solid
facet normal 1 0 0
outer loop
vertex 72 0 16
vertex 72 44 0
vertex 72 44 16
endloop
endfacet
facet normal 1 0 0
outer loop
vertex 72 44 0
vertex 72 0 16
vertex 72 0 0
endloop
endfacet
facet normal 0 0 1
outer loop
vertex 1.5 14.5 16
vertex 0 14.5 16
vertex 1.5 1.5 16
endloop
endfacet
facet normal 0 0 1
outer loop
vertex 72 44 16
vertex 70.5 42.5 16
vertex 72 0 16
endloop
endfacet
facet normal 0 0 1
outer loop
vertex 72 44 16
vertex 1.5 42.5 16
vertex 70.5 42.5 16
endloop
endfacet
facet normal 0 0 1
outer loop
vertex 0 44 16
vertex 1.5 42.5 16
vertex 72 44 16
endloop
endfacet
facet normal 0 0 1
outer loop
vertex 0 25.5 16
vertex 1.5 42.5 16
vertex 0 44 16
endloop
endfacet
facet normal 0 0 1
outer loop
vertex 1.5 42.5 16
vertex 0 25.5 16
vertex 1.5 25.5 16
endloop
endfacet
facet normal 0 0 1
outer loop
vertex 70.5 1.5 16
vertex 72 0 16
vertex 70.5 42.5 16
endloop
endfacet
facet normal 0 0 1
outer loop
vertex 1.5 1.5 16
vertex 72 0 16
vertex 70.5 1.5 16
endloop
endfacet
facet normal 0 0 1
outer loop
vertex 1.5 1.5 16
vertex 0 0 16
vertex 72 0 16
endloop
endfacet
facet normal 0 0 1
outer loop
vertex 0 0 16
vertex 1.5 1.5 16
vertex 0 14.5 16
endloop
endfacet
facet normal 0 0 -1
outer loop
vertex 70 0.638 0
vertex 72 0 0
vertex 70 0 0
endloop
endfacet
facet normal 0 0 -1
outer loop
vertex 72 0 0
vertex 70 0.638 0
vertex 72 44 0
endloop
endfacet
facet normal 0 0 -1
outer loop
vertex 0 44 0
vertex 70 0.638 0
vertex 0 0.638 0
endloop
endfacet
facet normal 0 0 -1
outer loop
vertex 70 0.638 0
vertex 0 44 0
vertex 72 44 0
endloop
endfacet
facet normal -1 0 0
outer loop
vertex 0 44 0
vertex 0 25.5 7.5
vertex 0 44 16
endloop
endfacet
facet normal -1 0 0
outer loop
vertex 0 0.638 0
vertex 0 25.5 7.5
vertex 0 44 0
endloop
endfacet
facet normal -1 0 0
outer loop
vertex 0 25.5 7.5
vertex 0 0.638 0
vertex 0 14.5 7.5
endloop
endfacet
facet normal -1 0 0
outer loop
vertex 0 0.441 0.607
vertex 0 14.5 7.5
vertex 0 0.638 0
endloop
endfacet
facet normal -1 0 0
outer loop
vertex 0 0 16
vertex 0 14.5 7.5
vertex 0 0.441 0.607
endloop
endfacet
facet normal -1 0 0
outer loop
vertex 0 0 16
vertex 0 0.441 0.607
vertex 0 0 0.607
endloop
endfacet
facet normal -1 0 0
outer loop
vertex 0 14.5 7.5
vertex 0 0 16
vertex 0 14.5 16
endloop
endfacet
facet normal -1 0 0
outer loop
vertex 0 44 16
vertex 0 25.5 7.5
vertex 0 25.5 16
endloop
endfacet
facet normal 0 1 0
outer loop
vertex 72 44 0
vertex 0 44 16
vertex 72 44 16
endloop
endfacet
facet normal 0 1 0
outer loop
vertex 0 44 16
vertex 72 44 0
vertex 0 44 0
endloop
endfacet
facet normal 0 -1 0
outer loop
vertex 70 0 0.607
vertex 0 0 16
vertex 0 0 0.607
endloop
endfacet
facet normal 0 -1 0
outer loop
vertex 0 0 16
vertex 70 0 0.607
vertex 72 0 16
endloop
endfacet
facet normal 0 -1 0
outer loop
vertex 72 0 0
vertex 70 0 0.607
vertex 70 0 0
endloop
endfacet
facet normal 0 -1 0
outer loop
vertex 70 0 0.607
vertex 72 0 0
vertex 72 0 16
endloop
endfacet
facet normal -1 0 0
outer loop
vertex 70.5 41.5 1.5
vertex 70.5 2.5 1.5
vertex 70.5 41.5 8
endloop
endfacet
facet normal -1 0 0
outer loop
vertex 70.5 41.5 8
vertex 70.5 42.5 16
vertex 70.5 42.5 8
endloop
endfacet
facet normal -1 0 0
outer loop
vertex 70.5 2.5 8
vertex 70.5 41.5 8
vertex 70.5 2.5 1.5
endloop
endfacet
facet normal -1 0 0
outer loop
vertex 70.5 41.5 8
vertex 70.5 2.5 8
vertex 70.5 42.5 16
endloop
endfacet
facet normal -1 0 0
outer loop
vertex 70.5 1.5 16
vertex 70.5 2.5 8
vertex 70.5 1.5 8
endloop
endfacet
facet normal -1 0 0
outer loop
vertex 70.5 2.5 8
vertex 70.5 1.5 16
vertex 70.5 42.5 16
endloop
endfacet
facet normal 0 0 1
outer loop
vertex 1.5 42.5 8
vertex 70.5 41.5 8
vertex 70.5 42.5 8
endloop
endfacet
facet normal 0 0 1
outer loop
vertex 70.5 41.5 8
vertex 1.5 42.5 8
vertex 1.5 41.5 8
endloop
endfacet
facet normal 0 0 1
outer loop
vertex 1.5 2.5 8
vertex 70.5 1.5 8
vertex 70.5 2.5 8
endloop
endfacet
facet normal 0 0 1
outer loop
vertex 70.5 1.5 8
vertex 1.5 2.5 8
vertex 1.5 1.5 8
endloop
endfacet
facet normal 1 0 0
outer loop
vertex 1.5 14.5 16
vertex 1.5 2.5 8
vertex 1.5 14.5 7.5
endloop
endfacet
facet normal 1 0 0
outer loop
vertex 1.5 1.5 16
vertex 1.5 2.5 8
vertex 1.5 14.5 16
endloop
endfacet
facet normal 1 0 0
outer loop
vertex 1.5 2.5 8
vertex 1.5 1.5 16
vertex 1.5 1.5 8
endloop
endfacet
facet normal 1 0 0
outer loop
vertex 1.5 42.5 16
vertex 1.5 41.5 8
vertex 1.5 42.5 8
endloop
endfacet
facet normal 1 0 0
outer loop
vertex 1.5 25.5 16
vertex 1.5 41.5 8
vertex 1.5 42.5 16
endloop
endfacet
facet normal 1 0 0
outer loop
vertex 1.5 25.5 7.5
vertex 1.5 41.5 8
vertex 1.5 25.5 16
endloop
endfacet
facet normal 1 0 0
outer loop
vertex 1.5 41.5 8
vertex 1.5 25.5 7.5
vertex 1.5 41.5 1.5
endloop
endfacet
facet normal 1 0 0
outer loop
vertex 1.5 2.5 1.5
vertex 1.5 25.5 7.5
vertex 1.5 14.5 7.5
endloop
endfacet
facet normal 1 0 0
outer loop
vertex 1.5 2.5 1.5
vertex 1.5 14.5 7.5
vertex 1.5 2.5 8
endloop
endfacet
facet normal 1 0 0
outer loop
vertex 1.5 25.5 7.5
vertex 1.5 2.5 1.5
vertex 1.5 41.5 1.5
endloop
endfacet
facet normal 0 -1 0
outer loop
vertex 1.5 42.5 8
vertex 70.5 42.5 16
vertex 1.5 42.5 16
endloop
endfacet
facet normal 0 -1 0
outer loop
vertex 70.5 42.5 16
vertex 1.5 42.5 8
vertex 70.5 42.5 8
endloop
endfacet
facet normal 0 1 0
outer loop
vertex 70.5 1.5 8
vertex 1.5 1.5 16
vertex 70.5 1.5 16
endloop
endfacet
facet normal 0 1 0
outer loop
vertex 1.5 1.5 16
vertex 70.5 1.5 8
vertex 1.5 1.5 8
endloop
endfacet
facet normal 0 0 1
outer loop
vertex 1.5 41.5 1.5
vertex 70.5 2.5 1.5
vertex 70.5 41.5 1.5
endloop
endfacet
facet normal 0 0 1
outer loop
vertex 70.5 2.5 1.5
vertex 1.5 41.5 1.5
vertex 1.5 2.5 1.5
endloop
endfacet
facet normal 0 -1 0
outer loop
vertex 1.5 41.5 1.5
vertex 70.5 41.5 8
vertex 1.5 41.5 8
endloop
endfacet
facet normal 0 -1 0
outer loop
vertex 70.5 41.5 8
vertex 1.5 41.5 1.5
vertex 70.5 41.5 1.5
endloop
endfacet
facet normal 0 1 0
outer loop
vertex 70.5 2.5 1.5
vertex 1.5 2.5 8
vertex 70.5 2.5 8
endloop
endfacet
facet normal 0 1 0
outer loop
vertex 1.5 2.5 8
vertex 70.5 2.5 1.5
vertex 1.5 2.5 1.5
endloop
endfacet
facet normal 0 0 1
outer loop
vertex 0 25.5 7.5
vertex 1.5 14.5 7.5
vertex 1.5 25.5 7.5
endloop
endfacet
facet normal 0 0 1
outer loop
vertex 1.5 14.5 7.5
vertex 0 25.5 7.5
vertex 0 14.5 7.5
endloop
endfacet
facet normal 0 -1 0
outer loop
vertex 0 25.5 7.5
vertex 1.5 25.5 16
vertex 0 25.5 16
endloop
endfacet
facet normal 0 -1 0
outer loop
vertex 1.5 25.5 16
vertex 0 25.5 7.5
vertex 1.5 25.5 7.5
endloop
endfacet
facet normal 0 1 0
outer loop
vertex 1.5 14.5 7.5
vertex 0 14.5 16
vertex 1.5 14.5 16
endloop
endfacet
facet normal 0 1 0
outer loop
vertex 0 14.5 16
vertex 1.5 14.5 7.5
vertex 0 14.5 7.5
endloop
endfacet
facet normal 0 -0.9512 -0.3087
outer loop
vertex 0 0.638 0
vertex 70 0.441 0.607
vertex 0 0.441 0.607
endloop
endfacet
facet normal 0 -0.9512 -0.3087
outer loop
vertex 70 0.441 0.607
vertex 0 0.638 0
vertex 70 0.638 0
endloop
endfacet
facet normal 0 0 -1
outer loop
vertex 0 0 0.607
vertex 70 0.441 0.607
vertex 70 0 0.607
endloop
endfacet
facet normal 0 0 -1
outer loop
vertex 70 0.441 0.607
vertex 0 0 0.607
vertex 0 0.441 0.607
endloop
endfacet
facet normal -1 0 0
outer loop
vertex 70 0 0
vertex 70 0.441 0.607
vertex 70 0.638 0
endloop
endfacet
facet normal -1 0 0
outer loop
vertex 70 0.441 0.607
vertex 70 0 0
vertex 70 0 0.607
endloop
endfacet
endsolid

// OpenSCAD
module open_therm() {
  difference() {
    cube([39,29,12]);  
    translate([2,2,2]) cube([35,25,10]);   
  } 
  translate([4,4,0]) cylinder(d=5,h=4);
  translate([4,4,0]) cylinder(d=2,h=6);
  
  translate([35,25,0]) cylinder(d=5,h=4);
  translate([35,25,0]) cylinder(d=2,h=6);
}

module hall_pcb() {
  difference() {  
    cube([50,20,20]);
    translate([6.5,2.5,3.5]) cube([30,15,2]);  //pcb ausschnitt
    translate([7.5,3.5,1.5]) cube([28,13,2]); //pb lötseite  
    translate([1.2,1.2,5.5]) cube([47.6,17.6,20]);
  }
}

module hall_top() {
  cube([50,20,1.2]); 
  translate([1.5,1.5,1.2]) cube([47.5,17.5,1.2]);  
}

//noppen,platehöhe
module case_bottom(breit,tief,hoch) {
  difference() {  
    cube([breit*8,tief*8,hoch*3.2]); 
    translate([1.2,1.2,1.2]) cube([breit*8-2.4,tief*8-2.4,hoch*3.2]);  
  }
  translate([0,0,hoch*3.2-6.4]) wand_noppe();  
  translate([breit*8-16,tief*8,hoch*3.2-6.4]) rotate([0,0,270]) wand_noppe(); 
}

module wand_noppe() {
  hull () { 
    difference() {  
    cube([8,16,6.4]);
    translate([1.2,0,0]) cube([8,16,5.2]);    
  }
  }
  $fn=20;
  translate([4,4,6.4]) cylinder(d=3.2,h=1.8);
  translate([4,12,6.4]) cylinder(d=3.2,h=1.8);
}

module case_top(breit,tief,hoch) {
    difference() {  
    cube([breit*8,tief*8,hoch*3.2]); 
    translate([1.2,1.2,0]) cube([breit*8-2.4,tief*8-2.4,hoch*3.2-1.2]);  
  }
}

module hall_sensor() {
    difference() {
      union() {
        translate([0,6,0]) cylinder(d=12,h=18.5);
        // pcb raum
        translate([0,-8,0]) cube([36,20,18.5]); 
        translate([0,12,0]) cube([2,10,18]);  
      }
      //nute
      translate([0,8,1.5]) cube([32,1.6,1.5]);
      
      //innen 
      translate([1.5,-6.5,3]) cube([33,17,16]);
      translate([0,6,1.5]) cylinder(d=9,h=18);
      //stecker
      translate([34,2.5,4]) cube([2,3,15]);
    }
  translate([0,-60,0]) 
    difference() {
    union() {
      cylinder(d=12,h=1.5);
      translate([0,-6,0]) cube([40,20,1.5]);
      translate([0,0,1.5]) cylinder(d=9,h=1.5);  
      translate([1.5,-4.5,1.5]) cube([37,17,1.5]);
      translate([37,0,0]) cube([1.5,10,10]);
    }
    translate([0,-2.5,1.5]) cube([32,2,2]);
    }
}

module open_therm_botton() {
  difference () {
    cube([40,30,14]);
    translate([1.5,1.5,1.5]) cube([37,27,12.5]);  
    translate([0,15,5]) rotate([0,90,0]) cylinder($fn=16,h=2,r=2.5);  
      
  }
  translate([4.5,5,0]) union() {
      cylinder($fn=16,h=4,r=1.5);
      cylinder($fn=16,h=2.5,r=2.5);
  }
  translate([34.5,23,0]) union() {
      cylinder($fn=16,h=4,r=1.5);
      cylinder($fn=16,h=2.5,r=2.5);
  }
}

module mhi_ctrl_botton() {
  difference() {
    box_botton(69,41,8);  
  
  //  cube([69,44,15]); 
  //  translate([1.5,1.5,10]) cube([66,41,15]); 
  //  translate([1.5,2.5,1.5]) cube([65,39,10]); 
    //ausschnitt
    translate([0,14.5,7.5]) cube([7,11,10]); 
    //phase  
    rotate([0,90,0]) cylinder(r=0.75,h=70); 
      
  } 
}

module mhi_ctrl_top() {
  difference() {  
    box_top(64,41,20);
    translate([0,20,-3]) cube([4,12,5]);//bme
    translate([1.2,27,-3]) cube([2,14,16]);//c
    translate([64,12,-3]) cube([5,15,6]);//kabel
  }
  //cover bme280
  translate ([-15,15,-5]) difference() {
    cube([15,20,27]); 
    translate([1.5,1.5,0]) cube([13.5,17.5,25]); 
    for (zl = [4:4:16]) {  
    for (lo = [4:4:16]) { 
      translate([0,lo,zl]) rotate([0,90,0]) cylinder(h=10,r=1.5,$fn=8); 
        
    } 
    }
    //nase
    translate([15,20,0]) rotate([90,0,0]) cylinder(h=20,r=5); 
  }
  
}

module box_botton(pcbx,pcby,pcbh) {
  difference() {
    cube([pcbx+3,pcby+3,pcbh+8]);
    translate([1.5,1.5,pcbh]) cube([pcbx,pcby,10]); 
    translate([1.5,2.5,1.5]) cube([pcbx,pcby-2,pcbh]);  
  }  
}

module box_top(pcbx,pcby,pcbh) {
  // wand 1.2 + 0.25 platz 0.75 rand
  difference() {
    union() {
      cube([pcbx+4.4,pcby+4.4,pcbh+2]); 
      translate([1.45,1.45,pcbh]) cube([pcbx+0.5,pcby+0.5,5]);  
    }
    translate([2.45,2.45,1.5]) cube([pcbx-2,pcby-2,pcbh+10]);
  }
}

module lilygo_botton() {
  difference() {  
    box_botton(117,63,20);
  }
}



//open_therm();
//hall_top();
//case_bottom(8,4,3);
//case_top(8,4,3);
//hall_sensor();
//open_therm_botton();
mhi_ctrl_botton();
//mhi_ctrl_top();
//translate([58,12,0]) cube([4,24,3]);//kabel

//box_botton(64,41,10);
//box_top(64,41,17); 
//lilygo_botton();



//translate([0,0,25]) mhi_ctrl_top();
